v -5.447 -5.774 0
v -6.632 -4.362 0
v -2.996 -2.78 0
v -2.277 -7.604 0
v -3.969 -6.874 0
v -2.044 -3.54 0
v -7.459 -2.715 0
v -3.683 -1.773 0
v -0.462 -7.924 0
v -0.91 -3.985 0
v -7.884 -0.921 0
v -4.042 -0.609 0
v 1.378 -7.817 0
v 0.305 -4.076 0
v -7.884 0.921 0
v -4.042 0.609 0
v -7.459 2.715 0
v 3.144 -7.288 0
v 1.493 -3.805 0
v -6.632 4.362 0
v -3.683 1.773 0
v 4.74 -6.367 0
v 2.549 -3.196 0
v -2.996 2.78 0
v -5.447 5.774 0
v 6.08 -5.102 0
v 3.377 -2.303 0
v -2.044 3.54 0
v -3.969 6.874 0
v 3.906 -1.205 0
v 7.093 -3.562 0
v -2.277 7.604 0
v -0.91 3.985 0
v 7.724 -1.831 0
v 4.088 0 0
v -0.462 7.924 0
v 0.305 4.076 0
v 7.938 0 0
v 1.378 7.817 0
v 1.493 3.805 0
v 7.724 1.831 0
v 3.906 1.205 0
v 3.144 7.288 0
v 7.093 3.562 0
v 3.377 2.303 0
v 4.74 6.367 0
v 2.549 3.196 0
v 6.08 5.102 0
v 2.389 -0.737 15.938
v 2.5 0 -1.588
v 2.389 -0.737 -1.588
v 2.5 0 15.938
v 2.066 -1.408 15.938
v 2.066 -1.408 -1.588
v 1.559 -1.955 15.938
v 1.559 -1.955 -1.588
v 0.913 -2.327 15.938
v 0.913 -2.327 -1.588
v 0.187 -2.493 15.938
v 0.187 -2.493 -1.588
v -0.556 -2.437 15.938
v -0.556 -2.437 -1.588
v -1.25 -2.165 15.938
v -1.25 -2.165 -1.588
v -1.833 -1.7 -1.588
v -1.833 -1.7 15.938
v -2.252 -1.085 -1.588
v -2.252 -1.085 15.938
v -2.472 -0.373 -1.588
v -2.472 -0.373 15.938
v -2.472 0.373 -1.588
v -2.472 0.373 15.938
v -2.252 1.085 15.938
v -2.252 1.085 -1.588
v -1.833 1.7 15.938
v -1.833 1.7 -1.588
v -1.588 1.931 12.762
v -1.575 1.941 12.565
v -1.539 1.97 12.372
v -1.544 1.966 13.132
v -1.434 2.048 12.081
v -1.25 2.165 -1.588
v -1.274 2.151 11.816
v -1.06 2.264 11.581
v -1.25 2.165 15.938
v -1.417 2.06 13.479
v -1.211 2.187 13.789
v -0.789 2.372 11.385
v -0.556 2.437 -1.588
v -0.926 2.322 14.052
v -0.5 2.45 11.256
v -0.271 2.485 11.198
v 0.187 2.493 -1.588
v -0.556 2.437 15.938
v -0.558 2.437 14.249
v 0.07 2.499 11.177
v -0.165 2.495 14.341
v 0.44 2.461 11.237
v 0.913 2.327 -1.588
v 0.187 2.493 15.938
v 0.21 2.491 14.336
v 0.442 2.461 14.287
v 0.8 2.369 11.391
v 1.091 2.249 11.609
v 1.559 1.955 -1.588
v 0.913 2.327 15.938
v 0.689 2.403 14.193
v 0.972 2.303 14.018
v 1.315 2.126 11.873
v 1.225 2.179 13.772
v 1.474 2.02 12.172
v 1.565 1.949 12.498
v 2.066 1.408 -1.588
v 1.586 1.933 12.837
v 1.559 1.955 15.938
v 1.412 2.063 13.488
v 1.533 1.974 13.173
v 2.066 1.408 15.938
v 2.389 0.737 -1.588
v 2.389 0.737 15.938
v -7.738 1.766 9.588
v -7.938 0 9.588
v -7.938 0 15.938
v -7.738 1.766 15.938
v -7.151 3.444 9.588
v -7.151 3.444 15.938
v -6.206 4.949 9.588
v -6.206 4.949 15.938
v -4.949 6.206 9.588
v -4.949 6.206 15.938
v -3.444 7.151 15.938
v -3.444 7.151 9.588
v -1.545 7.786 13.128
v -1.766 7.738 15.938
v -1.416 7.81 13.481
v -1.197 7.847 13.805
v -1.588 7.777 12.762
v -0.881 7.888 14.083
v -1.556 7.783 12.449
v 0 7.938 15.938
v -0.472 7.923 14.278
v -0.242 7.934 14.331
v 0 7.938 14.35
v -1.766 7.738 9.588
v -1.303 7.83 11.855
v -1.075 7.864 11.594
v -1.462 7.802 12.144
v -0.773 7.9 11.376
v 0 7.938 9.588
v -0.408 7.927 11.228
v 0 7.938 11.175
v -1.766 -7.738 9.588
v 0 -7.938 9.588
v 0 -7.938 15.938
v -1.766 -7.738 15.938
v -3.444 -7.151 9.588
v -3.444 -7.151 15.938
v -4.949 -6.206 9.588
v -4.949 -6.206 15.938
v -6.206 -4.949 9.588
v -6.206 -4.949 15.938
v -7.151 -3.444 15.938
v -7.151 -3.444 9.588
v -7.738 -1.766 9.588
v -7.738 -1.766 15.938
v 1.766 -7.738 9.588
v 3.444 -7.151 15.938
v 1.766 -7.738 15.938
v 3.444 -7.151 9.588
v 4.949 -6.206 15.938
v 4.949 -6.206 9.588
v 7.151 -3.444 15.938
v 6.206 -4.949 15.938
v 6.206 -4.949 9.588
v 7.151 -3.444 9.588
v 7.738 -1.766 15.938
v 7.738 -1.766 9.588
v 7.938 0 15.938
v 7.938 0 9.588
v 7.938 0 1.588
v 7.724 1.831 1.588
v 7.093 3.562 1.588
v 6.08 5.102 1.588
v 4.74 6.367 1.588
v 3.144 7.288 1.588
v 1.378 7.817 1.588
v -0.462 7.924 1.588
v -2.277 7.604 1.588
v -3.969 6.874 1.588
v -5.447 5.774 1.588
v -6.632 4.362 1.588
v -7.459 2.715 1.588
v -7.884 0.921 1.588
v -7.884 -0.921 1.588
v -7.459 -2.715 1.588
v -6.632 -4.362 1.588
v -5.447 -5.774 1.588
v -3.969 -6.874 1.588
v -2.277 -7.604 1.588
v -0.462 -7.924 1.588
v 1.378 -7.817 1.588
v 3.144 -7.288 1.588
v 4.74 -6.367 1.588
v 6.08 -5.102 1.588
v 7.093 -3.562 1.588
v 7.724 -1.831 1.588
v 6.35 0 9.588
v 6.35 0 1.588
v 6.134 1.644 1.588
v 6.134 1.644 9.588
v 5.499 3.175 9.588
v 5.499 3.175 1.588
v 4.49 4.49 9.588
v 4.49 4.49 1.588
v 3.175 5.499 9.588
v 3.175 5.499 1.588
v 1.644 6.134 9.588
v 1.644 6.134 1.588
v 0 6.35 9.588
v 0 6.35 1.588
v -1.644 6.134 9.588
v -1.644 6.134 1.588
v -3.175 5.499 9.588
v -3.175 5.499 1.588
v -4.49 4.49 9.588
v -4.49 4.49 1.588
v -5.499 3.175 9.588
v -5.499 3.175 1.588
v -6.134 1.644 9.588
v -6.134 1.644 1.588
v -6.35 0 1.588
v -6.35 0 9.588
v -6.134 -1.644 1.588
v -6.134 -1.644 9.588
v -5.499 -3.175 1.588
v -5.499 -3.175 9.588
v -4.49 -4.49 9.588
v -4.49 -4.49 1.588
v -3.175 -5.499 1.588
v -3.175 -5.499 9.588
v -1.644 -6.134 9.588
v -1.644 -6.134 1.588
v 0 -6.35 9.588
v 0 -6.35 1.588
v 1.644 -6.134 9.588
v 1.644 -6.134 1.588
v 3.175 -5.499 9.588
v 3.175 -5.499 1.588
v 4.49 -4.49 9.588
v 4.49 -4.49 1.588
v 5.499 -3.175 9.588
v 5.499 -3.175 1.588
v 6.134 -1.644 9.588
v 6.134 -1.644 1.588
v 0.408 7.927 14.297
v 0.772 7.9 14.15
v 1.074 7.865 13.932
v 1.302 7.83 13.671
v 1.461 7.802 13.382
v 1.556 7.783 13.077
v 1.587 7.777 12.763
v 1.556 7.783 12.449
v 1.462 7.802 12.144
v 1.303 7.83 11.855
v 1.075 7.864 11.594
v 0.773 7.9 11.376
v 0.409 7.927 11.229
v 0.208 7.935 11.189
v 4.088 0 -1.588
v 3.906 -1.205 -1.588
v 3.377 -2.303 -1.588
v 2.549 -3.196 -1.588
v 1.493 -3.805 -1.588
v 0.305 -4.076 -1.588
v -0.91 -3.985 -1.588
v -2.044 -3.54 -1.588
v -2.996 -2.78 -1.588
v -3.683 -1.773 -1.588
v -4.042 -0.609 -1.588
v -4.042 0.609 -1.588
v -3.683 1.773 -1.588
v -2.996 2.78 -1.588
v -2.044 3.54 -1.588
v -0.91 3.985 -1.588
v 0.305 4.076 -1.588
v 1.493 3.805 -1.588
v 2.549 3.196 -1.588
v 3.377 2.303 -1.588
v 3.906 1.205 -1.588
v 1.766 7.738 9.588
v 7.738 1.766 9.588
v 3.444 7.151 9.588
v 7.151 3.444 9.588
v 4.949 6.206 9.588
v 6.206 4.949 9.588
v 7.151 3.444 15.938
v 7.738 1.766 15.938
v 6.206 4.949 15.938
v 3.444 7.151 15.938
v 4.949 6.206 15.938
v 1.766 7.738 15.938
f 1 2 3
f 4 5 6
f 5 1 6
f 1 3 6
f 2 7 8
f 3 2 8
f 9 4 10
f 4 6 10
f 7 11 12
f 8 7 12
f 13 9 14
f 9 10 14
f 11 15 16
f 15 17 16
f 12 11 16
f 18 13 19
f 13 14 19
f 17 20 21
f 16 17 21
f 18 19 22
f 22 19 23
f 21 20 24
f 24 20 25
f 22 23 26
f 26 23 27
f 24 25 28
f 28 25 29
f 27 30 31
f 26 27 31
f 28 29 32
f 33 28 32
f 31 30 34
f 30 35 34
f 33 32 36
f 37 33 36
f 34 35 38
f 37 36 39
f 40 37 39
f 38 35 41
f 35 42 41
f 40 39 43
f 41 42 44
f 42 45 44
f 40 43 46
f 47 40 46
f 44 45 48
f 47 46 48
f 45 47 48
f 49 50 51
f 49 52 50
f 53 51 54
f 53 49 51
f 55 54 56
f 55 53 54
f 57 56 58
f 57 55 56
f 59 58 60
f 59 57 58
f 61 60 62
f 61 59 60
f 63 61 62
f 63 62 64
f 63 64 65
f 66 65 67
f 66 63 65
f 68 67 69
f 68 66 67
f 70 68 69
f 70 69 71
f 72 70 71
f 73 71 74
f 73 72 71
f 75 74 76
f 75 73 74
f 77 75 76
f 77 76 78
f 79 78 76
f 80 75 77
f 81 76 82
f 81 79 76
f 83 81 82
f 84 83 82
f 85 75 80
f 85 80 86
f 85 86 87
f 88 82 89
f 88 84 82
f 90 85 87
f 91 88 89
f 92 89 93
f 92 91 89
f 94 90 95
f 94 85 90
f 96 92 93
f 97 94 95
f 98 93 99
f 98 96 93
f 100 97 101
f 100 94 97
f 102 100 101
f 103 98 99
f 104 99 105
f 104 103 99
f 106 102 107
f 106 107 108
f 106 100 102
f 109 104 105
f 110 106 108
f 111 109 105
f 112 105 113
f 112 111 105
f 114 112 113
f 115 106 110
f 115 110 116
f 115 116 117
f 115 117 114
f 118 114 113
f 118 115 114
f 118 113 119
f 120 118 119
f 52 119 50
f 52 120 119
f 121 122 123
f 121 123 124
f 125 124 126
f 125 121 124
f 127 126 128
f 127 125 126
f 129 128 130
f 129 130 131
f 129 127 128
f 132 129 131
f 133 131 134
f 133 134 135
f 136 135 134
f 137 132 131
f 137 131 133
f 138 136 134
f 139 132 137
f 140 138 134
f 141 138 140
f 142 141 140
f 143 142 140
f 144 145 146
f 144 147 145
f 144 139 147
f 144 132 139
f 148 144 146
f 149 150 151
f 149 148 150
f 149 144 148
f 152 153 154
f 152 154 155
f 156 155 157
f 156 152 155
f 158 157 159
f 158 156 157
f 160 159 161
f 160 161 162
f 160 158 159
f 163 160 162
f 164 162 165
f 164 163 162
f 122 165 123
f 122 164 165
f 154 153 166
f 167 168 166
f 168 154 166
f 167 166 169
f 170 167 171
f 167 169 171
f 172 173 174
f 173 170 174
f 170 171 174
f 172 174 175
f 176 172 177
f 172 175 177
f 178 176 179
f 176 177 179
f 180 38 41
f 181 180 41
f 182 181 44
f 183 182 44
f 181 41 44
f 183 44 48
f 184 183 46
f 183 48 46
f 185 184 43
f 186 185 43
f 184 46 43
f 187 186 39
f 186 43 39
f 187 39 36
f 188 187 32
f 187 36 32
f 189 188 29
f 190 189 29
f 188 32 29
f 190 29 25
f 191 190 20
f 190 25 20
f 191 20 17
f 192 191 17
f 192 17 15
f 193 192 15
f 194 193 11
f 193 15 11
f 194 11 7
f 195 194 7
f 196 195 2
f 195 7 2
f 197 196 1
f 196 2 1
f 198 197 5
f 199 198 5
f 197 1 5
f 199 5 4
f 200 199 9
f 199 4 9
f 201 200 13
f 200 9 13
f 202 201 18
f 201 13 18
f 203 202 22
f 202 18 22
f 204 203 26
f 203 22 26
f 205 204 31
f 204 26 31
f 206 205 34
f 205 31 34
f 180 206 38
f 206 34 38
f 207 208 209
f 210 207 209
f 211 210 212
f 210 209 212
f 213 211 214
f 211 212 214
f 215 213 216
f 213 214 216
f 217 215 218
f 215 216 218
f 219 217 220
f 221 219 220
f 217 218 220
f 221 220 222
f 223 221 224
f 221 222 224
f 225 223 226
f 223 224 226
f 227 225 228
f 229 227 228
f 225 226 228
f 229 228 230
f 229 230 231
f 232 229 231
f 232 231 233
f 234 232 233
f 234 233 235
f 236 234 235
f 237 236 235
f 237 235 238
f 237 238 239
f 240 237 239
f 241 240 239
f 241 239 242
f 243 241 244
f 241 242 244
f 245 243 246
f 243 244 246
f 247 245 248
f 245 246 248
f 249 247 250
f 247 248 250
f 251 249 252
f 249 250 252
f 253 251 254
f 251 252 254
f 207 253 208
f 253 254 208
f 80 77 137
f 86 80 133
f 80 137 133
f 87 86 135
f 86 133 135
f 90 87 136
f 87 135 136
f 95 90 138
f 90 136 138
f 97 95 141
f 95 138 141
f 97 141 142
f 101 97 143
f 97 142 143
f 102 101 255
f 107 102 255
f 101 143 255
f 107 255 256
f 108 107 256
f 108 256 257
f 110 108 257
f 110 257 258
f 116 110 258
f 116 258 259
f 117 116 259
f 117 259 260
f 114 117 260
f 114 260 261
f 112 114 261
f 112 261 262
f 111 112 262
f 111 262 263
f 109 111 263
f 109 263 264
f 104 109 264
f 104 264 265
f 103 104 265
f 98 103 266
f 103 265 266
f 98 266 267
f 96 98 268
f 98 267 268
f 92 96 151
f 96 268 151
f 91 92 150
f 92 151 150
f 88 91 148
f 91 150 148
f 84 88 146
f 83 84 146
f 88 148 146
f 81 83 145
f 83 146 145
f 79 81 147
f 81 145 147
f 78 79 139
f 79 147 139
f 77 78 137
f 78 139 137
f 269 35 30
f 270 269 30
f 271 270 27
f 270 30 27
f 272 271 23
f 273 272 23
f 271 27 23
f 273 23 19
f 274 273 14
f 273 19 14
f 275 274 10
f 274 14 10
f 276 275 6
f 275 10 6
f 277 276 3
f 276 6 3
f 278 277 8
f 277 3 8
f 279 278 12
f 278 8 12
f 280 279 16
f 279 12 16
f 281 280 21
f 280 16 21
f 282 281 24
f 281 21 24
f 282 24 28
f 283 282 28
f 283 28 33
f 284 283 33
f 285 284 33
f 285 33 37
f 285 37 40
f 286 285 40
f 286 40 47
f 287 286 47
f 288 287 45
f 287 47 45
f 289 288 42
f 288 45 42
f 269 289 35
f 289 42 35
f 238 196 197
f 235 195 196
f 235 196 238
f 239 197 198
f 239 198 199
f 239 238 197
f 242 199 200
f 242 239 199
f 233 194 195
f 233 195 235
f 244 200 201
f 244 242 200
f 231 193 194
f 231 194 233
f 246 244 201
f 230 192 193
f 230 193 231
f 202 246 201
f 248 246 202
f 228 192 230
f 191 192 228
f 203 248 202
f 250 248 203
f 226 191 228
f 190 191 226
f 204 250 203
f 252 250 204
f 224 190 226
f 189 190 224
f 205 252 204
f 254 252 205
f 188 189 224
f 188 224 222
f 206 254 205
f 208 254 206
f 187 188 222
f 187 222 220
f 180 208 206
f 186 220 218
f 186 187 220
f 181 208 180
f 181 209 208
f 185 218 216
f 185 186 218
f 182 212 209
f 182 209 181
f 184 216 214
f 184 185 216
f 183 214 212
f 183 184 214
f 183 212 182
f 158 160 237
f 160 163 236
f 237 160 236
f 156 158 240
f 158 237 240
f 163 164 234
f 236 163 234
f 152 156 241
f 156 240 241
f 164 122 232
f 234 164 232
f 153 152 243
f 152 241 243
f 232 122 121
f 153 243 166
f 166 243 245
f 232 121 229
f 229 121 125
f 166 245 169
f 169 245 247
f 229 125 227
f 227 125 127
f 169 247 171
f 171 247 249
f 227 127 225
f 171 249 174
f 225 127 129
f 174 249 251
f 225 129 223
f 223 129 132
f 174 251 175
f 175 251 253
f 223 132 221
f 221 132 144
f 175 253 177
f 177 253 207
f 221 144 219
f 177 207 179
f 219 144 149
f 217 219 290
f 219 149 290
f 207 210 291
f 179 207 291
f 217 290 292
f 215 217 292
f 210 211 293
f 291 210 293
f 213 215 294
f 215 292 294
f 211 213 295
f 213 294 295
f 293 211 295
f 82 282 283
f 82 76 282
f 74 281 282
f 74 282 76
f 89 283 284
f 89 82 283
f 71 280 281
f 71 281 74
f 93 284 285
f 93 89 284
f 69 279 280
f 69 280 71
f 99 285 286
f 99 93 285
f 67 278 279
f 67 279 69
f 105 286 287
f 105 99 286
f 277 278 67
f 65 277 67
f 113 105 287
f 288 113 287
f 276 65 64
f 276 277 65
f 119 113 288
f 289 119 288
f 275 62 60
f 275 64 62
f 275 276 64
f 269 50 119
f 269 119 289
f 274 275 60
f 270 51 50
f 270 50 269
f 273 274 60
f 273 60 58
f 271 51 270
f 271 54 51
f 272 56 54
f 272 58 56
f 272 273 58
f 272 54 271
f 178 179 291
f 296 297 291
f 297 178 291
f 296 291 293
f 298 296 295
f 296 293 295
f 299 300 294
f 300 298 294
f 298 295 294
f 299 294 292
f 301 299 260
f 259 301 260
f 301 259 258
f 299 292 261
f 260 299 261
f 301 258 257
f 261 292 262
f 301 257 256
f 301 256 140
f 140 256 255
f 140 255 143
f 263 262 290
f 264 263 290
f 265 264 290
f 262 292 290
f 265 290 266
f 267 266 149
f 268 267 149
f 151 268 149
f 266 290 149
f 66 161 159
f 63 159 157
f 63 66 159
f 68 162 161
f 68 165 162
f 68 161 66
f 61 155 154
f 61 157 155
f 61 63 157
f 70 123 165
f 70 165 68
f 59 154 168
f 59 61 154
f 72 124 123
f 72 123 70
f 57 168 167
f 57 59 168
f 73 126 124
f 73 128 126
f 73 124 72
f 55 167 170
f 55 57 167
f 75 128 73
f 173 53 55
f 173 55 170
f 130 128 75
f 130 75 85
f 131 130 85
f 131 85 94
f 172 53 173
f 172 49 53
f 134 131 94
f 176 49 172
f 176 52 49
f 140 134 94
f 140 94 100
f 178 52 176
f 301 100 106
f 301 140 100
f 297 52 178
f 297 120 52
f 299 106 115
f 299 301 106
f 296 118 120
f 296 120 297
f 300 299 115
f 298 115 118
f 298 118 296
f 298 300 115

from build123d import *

# Parameters (mm, degrees)
F0_R         = 7.9375
F1_DEPTH     = 1.5875
F2_R         = 6.35
F3_DEPTH     = 8
F4_W         = 15.875
F4_H         = 15.875
F5_DEPTH     = 6.35
F6_R         = 2.5
F7_DEPTH     = 15.9375
F8_R         = 1.5875
F9_REACH     = 20.3661280605
F10_T1_DEPTH = 46.0375
F11_R        = 4.0875
F11_R_2      = 2.5
F12_DEPTH    = 1.5875


# Not quite as in the source:
# - a fillet or chamfer that OpenCascade refuses, or shapes differently, is made with other operations: its cross-section is extruded or revolved along the edge and cut away or added


with BuildPart() as f1:
    # F0 (on Top) → F1 (new body)
    with BuildSketch(Plane.XY):
        Circle(F0_R)
    extrude(amount=F1_DEPTH)

    # F2 (on face) → F3 (join)
    with BuildSketch(Plane.XY.offset(1.5875)):
        Circle(F2_R)
    extrude(amount=F3_DEPTH)

    # F4 (on face) → F5 (join)
    with BuildSketch(Plane.XY.offset(9.5875)):
        Rectangle(F4_W, F4_H)
    extrude(amount=F5_DEPTH)

    # F6 (on face) → F7 (cut, through all)
    with BuildSketch(Plane.XY.offset(15.9375)):
        Circle(F6_R)
    extrude(amount=-F7_DEPTH, mode=Mode.SUBTRACT)

    f9_end = f1.faces().sort_by_distance((-2.5, 0, 7.96875))[0]
    # F8 (on face) → F9 (cut, up to a face of the model that its end follows)
    with BuildSketch(Plane(origin=(0, 7.9375, 0), x_dir=(-1, 0, 0), z_dir=(0, 1, 0))):
        with Locations((0, 12.7625)):
            Circle(F8_R)
    f9_long = extrude(amount=-F9_REACH, mode=Mode.PRIVATE)
    add(split(f9_long, bisect_by=f9_end, keep=Keep.ALL, mode=Mode.PRIVATE).solids().sort_by_distance((0, 7.9375, 12.7625))[0], mode=Mode.SUBTRACT)

    # F10: fillet of radius 7.9375 on 4 edges, made by hand

    # F10_s2 → F10_t1 (cut)
    with BuildSketch(Plane.XY.offset(-10.25625)):
        with BuildLine():
            ThreePointArc((-7.9375, 0), (-5.6126600757, 5.6126600757), (0, 7.9375))
            Line((0, 7.9375), (-7.9375, 7.9375))
            Line((-7.9375, 7.9375), (-7.9375, 0))
        make_face()
        with BuildLine():
            ThreePointArc((0, -7.9375), (-5.6126600757, -5.6126600757), (-7.9375, 0))
            Line((-7.9375, 0), (-7.9375, -7.9375))
            Line((-7.9375, -7.9375), (0, -7.9375))
        make_face()
        with BuildLine():
            ThreePointArc((7.9375, 0), (5.6126600757, 5.6126600757), (0, 7.9375))
            Line((0, 7.9375), (7.9375, 7.9375))
            Line((7.9375, 7.9375), (7.9375, 0))
        make_face()
        with BuildLine():
            ThreePointArc((0, -7.9375), (5.6126600757, -5.6126600757), (7.9375, 0))
            Line((7.9375, 0), (7.9375, -7.9375))
            Line((7.9375, -7.9375), (0, -7.9375))
        make_face()
    extrude(amount=F10_T1_DEPTH, mode=Mode.SUBTRACT)

    # F11 (on face) → F12 (join)
    with BuildSketch(Plane(origin=(0, 0, 0), x_dir=(1, 0, 0), z_dir=(0, 0, -1))):
        Circle(F11_R)
        Circle(F11_R_2, mode=Mode.SUBTRACT)
    extrude(amount=F12_DEPTH)


solid = f1.part
